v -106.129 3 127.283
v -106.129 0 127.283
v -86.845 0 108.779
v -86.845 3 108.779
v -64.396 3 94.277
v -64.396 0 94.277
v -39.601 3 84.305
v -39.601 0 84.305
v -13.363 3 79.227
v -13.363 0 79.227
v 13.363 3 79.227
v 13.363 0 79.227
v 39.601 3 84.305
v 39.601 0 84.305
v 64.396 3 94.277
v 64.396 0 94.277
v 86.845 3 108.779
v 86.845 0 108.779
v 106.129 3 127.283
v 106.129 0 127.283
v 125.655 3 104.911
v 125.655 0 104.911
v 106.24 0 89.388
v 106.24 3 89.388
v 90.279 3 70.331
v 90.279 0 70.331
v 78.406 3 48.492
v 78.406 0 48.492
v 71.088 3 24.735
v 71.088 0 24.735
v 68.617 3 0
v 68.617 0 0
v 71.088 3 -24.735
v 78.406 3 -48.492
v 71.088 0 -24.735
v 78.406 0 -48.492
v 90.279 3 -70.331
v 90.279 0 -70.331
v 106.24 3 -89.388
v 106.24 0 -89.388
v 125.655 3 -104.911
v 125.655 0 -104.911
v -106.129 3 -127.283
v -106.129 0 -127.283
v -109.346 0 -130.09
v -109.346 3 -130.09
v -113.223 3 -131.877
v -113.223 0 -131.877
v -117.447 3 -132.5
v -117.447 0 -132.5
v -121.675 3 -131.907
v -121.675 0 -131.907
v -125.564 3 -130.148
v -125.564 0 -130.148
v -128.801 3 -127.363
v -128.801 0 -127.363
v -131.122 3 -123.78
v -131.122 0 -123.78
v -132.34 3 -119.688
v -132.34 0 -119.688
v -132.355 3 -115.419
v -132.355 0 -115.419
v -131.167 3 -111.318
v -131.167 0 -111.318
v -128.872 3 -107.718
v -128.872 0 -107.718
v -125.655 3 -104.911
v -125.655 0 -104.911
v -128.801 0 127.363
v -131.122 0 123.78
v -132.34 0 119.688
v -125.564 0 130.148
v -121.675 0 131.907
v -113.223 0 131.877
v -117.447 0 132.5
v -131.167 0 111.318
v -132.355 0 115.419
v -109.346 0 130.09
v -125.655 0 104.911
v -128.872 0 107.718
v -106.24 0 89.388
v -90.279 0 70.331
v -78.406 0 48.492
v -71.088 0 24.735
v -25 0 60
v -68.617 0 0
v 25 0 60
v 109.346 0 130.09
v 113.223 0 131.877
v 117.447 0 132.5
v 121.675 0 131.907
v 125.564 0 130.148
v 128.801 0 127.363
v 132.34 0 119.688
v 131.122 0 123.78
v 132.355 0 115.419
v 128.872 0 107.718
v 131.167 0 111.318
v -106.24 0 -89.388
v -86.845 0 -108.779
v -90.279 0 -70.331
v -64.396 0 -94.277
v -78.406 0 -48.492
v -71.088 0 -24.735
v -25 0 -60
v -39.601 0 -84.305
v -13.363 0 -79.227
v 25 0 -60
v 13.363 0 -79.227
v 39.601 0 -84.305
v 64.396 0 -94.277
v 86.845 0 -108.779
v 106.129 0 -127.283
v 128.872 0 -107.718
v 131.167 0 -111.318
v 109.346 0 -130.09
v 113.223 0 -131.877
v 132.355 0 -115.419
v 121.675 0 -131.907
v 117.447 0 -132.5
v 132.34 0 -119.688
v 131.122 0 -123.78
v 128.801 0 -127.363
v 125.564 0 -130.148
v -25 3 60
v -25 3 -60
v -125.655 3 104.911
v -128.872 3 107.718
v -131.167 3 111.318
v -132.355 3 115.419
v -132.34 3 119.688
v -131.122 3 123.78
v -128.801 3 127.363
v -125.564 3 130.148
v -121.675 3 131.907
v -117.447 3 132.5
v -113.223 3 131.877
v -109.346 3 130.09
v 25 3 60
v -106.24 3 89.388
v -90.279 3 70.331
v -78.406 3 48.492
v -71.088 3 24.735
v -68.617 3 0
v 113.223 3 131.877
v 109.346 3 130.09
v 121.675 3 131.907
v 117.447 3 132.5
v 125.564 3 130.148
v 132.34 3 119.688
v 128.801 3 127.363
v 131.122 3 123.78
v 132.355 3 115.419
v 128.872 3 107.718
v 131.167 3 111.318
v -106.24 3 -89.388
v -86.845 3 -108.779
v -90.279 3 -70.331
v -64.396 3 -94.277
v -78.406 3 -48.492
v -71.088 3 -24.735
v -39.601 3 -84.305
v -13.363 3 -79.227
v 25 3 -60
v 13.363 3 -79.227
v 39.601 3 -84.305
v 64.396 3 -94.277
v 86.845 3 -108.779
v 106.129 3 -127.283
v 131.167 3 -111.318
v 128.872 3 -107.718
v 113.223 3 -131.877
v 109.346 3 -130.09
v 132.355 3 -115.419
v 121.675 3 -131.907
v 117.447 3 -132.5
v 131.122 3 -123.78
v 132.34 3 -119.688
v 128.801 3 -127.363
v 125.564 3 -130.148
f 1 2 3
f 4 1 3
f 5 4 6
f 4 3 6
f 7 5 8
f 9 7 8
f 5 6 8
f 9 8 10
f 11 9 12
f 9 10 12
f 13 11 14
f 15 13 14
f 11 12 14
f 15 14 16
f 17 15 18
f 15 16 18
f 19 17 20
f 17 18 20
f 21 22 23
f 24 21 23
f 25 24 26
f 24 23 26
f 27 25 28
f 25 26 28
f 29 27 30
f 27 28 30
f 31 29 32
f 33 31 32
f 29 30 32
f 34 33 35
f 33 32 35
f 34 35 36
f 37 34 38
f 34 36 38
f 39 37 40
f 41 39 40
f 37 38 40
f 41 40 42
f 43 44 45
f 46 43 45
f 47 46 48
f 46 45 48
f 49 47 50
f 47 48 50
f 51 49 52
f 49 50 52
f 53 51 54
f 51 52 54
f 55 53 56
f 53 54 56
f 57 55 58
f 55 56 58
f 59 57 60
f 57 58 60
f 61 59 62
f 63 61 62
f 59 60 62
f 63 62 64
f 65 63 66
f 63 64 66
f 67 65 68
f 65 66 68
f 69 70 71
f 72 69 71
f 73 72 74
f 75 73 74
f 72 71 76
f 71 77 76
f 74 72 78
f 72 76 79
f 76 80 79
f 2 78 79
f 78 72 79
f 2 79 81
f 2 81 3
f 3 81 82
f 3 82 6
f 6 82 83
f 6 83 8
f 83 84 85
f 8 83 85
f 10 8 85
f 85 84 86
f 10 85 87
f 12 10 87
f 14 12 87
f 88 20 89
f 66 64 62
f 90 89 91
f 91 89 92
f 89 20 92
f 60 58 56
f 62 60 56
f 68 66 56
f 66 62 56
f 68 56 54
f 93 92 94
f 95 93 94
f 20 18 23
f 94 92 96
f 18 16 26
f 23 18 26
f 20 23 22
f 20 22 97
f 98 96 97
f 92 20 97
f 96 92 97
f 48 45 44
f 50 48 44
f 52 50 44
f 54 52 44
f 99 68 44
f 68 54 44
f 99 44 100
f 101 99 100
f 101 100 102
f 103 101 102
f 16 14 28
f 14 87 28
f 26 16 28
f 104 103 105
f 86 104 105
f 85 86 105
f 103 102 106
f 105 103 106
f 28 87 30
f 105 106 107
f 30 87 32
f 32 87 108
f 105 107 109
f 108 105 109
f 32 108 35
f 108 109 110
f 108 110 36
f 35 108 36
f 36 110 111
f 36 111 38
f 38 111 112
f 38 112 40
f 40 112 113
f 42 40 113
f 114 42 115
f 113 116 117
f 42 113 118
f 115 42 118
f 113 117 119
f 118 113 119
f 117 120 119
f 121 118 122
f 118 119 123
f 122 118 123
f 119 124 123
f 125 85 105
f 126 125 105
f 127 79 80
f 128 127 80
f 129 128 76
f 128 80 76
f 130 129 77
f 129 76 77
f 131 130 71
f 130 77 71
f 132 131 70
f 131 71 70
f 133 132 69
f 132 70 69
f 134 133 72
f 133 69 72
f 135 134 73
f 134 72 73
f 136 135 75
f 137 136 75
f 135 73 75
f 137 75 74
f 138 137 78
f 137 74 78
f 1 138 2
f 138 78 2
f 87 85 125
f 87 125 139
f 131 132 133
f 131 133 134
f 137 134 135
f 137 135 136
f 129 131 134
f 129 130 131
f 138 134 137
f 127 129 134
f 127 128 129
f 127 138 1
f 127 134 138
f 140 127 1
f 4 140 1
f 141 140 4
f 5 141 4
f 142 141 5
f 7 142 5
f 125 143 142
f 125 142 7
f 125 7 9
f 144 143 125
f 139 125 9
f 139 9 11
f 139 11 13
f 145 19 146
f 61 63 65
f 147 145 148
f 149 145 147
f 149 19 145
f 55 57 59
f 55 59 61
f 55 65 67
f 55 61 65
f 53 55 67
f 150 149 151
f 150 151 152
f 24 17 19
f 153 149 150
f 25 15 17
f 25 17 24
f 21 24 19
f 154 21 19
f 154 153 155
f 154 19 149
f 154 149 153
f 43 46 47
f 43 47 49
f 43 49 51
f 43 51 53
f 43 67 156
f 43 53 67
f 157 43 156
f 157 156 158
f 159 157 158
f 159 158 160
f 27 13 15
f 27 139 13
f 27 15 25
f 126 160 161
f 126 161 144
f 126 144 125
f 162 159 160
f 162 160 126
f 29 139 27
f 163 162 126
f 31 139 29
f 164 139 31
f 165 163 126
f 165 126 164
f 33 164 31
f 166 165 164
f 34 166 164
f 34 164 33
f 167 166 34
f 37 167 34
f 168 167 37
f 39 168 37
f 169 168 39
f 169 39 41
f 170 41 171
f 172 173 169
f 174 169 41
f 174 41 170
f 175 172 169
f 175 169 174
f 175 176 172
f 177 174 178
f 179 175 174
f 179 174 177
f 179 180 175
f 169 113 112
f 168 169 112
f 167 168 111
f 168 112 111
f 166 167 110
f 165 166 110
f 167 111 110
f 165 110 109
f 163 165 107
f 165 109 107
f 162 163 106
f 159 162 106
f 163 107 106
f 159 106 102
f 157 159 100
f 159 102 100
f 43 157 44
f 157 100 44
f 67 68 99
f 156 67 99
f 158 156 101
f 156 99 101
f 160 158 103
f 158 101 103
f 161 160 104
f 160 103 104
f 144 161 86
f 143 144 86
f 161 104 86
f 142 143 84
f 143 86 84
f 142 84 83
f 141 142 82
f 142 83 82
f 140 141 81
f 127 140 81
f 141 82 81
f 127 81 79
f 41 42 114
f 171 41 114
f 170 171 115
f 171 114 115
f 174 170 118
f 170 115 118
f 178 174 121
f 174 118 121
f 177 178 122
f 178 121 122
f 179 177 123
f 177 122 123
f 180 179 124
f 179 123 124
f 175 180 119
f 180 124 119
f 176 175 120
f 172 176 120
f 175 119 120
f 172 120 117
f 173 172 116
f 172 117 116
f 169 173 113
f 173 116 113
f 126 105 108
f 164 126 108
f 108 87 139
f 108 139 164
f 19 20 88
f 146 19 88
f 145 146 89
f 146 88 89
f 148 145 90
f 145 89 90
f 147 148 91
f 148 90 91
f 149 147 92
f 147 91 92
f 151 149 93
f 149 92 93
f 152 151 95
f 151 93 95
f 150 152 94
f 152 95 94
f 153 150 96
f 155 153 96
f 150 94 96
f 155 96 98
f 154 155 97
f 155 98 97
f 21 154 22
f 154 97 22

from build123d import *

# Parameters (mm, degrees)
SKETCH4_W           = 50
SKETCH4_H           = 120
BOSS_EXTRUDE1_DEPTH = 3


with BuildPart() as part:
    # Sketch4 → Boss-Extrude1 (new body)
    with BuildSketch(Plane(origin=(0, 0, 0), x_dir=(1, 0, 0), z_dir=(0, 1, 0))):
        with BuildLine():
            ThreePointArc((-106.129032258, 127.282693525), (-128.800946783, 127.363498456), (-125.655359293, 104.910714286))
            ThreePointArc((-125.655359293, 104.910714286), (-68.616686738, 0), (-125.655359293, -104.910714286))
            ThreePointArc((-125.655359293, -104.910714286), (-128.800946783, -127.363498456), (-106.129032258, -127.282693525))
            ThreePointArc((-106.129032258, -127.282693525), (0, -78.587833096), (106.129032258, -127.282693525))
            ThreePointArc((106.129032258, -127.282693525), (128.800946783, -127.363498456), (125.655359293, -104.910714286))
            ThreePointArc((125.655359293, -104.910714286), (68.616686738, 0), (125.655359293, 104.910714286))
            ThreePointArc((125.655359293, 104.910714286), (128.800946783, 127.363498456), (106.129032258, 127.282693525))
            ThreePointArc((106.129032258, 127.282693525), (0, 78.587833096), (-106.129032258, 127.282693525))
        make_face()
        Rectangle(SKETCH4_W, SKETCH4_H, mode=Mode.SUBTRACT)
    extrude(amount=BOSS_EXTRUDE1_DEPTH)


solid = part.part
